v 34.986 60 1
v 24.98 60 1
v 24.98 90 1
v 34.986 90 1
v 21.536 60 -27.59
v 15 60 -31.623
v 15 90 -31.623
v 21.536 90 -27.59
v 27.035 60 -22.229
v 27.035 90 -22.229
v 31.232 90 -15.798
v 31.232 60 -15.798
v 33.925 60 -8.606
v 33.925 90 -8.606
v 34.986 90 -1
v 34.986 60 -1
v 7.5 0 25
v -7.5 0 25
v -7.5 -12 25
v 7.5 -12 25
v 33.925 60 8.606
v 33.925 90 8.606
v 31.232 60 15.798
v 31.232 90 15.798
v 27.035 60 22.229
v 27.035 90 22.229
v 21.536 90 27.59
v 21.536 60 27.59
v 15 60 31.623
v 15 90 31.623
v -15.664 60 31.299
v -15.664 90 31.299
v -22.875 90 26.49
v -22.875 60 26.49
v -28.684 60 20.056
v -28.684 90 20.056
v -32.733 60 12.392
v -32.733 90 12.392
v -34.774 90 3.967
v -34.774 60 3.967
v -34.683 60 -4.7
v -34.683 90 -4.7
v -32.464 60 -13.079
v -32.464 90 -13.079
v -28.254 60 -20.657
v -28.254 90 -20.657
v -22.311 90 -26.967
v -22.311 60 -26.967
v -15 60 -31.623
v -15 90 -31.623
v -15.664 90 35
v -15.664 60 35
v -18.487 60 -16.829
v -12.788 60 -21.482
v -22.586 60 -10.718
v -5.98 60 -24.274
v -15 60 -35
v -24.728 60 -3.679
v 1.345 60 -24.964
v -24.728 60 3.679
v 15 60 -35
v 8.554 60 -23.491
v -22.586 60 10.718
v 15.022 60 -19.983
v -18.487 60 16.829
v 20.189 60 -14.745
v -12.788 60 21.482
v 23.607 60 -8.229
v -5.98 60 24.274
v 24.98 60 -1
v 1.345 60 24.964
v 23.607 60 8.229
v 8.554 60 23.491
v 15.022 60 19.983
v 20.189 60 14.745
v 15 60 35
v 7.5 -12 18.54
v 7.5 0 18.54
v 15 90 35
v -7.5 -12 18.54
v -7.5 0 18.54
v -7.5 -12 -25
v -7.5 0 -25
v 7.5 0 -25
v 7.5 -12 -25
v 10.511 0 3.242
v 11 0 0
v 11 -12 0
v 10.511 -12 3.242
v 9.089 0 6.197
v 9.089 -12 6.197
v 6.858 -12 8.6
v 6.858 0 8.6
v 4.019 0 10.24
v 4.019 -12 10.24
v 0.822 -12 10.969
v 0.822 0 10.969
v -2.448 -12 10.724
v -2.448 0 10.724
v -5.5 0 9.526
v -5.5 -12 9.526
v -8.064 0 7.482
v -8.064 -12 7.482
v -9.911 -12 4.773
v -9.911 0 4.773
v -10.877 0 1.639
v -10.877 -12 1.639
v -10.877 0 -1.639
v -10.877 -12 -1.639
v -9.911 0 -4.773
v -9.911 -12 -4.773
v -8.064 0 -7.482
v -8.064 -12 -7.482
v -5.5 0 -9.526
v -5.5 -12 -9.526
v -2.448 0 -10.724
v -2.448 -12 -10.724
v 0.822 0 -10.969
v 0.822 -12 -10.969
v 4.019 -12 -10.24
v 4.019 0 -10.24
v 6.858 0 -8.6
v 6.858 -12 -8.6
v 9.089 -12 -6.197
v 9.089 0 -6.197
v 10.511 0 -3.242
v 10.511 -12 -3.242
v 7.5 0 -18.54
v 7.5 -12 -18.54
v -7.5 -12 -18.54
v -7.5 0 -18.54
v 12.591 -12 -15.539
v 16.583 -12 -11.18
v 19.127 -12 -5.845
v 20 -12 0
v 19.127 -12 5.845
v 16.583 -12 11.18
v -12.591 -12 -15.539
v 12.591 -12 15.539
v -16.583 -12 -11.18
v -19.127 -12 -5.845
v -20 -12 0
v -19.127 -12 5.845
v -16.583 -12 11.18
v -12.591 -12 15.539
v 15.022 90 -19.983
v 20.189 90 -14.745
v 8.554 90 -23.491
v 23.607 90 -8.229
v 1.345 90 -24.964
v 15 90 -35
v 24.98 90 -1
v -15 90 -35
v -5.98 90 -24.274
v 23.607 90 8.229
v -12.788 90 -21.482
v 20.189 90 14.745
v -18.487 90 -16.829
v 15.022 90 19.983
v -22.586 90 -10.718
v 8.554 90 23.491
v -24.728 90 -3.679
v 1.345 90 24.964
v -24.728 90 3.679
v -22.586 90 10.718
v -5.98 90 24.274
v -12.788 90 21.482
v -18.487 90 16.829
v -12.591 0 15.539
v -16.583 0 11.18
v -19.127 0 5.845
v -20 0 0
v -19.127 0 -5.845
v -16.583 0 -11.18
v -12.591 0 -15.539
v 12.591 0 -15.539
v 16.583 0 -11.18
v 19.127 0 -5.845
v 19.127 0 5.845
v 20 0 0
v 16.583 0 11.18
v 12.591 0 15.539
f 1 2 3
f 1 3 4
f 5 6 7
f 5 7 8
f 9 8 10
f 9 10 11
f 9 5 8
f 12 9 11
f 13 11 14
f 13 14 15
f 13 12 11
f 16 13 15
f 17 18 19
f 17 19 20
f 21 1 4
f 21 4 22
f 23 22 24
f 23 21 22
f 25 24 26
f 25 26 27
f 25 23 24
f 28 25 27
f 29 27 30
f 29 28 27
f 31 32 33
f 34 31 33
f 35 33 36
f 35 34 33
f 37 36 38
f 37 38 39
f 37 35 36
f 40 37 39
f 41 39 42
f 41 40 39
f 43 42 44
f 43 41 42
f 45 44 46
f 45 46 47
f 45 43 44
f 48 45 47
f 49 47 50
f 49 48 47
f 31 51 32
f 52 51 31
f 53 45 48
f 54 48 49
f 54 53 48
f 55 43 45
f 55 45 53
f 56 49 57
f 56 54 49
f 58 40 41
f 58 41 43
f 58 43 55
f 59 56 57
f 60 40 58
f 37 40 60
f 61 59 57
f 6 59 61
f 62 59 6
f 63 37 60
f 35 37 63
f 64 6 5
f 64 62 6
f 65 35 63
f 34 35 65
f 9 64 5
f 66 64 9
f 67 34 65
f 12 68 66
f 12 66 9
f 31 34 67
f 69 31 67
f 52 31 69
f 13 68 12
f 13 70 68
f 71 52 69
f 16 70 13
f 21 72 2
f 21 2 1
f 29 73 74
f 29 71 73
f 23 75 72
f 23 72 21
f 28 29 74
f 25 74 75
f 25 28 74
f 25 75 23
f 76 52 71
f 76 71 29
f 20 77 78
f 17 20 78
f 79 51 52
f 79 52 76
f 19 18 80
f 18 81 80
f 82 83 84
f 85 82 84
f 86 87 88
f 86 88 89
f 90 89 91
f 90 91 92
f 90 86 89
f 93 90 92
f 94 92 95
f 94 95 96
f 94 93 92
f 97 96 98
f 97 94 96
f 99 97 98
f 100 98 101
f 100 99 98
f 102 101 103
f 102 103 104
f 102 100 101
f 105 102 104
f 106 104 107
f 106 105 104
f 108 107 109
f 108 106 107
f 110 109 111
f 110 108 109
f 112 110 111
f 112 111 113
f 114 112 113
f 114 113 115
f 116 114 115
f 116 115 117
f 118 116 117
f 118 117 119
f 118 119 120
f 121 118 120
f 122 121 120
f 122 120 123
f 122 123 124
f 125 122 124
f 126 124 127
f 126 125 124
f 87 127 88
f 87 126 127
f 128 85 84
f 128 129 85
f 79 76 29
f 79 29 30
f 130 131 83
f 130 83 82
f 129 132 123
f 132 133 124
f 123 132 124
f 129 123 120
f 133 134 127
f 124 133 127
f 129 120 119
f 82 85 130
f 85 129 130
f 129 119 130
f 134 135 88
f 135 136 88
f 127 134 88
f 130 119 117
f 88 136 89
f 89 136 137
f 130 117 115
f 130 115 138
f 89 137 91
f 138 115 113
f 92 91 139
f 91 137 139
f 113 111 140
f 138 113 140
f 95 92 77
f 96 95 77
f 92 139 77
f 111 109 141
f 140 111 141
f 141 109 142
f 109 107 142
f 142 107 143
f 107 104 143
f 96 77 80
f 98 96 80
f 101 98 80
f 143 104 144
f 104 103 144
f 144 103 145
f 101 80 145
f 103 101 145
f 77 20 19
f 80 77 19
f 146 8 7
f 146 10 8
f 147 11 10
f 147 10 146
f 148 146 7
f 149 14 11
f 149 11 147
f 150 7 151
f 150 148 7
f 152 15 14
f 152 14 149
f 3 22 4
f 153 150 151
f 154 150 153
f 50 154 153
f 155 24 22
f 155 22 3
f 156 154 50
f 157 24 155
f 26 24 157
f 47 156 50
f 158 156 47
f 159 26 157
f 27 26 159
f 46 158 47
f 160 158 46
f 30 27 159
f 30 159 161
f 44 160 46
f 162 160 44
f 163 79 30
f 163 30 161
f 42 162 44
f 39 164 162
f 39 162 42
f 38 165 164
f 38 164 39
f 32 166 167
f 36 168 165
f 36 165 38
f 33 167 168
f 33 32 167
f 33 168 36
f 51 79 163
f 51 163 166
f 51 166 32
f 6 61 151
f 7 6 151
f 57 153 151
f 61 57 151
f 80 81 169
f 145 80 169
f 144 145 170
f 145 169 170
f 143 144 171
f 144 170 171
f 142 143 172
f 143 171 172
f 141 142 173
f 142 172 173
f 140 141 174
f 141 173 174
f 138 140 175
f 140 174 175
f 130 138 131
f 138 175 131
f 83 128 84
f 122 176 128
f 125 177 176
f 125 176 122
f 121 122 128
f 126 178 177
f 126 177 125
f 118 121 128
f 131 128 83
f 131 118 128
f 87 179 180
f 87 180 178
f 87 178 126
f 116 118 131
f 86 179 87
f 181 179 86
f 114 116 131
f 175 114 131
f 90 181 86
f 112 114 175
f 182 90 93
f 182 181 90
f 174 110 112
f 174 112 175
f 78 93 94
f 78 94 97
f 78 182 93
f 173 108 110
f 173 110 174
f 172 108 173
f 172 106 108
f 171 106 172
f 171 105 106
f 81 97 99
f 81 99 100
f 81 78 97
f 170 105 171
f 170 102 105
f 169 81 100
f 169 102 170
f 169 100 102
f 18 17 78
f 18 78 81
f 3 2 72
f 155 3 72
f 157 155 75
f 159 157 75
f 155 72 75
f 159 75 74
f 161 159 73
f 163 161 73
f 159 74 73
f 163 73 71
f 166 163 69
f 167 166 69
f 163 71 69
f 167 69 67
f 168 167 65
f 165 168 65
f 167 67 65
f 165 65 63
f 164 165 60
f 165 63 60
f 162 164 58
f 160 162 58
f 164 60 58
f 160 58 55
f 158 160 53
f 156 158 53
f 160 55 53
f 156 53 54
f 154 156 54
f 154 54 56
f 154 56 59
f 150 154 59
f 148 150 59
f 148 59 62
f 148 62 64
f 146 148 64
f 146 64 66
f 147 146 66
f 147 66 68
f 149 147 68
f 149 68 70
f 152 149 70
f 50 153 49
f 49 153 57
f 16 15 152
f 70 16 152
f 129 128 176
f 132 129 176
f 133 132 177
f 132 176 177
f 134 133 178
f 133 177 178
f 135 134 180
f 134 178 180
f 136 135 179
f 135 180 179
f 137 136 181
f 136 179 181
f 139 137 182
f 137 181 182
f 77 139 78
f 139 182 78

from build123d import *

# Parameters (mm, degrees)
F0_R      = 20
F0_R_2    = 11
F1_DEPTH  = 12
F3_R      = 35
F3_R_2    = 25
F4_DEPTH  = 30
F6_DEPTH  = 30
F10_DEPTH = 3
F11_DEPTH = 5
F13_DEPTH = 3
F14_DEPTH = 5
F18_DEPTH = 5
F20_DEPTH = 5


with BuildPart() as f1:
    # F0 (on Front) → F1 (new body)
    with BuildSketch(Plane.XZ):
        Circle(F0_R)
        Circle(F0_R_2, mode=Mode.SUBTRACT)
    extrude(amount=F1_DEPTH)

    # F9 (on offset) → F10 (join)
    with BuildSketch(Plane.XY.offset(20)):
        Polygon((7.5, 0), (0, 0), (-7.5, 0), (-7.5, -12), (0, -12), (7.5, -12), align=None)
    extrude(amount=-F10_DEPTH)

    # F11 (add): a face of the model
    f11_faces = [f1.faces().sort_by_distance(p)[0] for p in [
        (0, -6, 20),
    ]]
    extrude(f11_faces, amount=F11_DEPTH)

    # F12 (on offset) → F13 (join)
    with BuildSketch(Plane.XY.offset(-20)):
        Polygon((7.5, 0), (0, 0), (-7.5, 0), (-7.5, -12), (0, -12), (7.5, -12), align=None)
    extrude(amount=F13_DEPTH)

    # F14 (add): a face of the model
    f14_faces = [f1.faces().sort_by_distance(p)[0] for p in [
        (0, -6, -20),
    ]]
    extrude(f14_faces, amount=F14_DEPTH)


with BuildPart() as f4:
    # F3 (on offset) → F4 (new body)
    with BuildSketch(Plane.XZ.offset(-60)):
        Circle(F3_R)
        Circle(F3_R_2, mode=Mode.SUBTRACT)
    extrude(amount=-F4_DEPTH)

    # F5 (on face) → F6 (cut)
    with BuildSketch(Plane(origin=(0, 90, 0), x_dir=(-1, 0, 0), z_dir=(0, 1, 0))):
        with BuildLine():
            ThreePointArc((-34.9857113691, -1), (-34.99642766, -0.5000510386), (-35, 0))
            Line((-35, 0), (-35, -1))
            Line((-35, -1), (-34.9857113691, -1))
        make_face()
        with BuildLine():
            Line((-35, 1), (-35, 0))
            ThreePointArc((-35, 0), (-34.99642766, 0.5000510386), (-34.9857113691, 1))
            Line((-34.9857113691, 1), (-35, 1))
        make_face()
        with BuildLine():
            Line((-22.5752126426, 1), (-24.9799919936, 1))
            ThreePointArc((-24.9799919936, 1), (-25, 0), (-24.9799919936, -1))
            Line((-24.9799919936, -1), (-22.5752126426, -1))
            Line((-22.5752126426, -1), (-22.5752126426, 1))
        make_face()
        with BuildLine():
            ThreePointArc((-34.9857113691, 1), (-34.99642766, 0.5000510386), (-35, 0))
            ThreePointArc((-35, 0), (-34.99642766, -0.5000510386), (-34.9857113691, -1))
            Line((-34.9857113691, -1), (-24.9799919936, -1))
            ThreePointArc((-24.9799919936, -1), (-25, 0), (-24.9799919936, 1))
            Line((-24.9799919936, 1), (-34.9857113691, 1))
        make_face()
    extrude(amount=-F6_DEPTH, mode=Mode.SUBTRACT)

    # F17 (on offset) → F18 (join)
    with BuildSketch(Plane.XY.offset(-35)):
        Polygon((-15, 60), (0, 60), (15, 60), (15, 90), (0, 90), (-15, 90), align=None)
    extrude(amount=F18_DEPTH)

    # F19 (on offset) → F20 (join)
    with BuildSketch(Plane.XY.offset(35)):
        Polygon((-15.6637862306, 60), (0, 60), (15, 60), (15, 90), (0, 90), (-15.6637862306, 90), align=None)
    extrude(amount=-F20_DEPTH)


solid = Compound([f1.part, f4.part])
